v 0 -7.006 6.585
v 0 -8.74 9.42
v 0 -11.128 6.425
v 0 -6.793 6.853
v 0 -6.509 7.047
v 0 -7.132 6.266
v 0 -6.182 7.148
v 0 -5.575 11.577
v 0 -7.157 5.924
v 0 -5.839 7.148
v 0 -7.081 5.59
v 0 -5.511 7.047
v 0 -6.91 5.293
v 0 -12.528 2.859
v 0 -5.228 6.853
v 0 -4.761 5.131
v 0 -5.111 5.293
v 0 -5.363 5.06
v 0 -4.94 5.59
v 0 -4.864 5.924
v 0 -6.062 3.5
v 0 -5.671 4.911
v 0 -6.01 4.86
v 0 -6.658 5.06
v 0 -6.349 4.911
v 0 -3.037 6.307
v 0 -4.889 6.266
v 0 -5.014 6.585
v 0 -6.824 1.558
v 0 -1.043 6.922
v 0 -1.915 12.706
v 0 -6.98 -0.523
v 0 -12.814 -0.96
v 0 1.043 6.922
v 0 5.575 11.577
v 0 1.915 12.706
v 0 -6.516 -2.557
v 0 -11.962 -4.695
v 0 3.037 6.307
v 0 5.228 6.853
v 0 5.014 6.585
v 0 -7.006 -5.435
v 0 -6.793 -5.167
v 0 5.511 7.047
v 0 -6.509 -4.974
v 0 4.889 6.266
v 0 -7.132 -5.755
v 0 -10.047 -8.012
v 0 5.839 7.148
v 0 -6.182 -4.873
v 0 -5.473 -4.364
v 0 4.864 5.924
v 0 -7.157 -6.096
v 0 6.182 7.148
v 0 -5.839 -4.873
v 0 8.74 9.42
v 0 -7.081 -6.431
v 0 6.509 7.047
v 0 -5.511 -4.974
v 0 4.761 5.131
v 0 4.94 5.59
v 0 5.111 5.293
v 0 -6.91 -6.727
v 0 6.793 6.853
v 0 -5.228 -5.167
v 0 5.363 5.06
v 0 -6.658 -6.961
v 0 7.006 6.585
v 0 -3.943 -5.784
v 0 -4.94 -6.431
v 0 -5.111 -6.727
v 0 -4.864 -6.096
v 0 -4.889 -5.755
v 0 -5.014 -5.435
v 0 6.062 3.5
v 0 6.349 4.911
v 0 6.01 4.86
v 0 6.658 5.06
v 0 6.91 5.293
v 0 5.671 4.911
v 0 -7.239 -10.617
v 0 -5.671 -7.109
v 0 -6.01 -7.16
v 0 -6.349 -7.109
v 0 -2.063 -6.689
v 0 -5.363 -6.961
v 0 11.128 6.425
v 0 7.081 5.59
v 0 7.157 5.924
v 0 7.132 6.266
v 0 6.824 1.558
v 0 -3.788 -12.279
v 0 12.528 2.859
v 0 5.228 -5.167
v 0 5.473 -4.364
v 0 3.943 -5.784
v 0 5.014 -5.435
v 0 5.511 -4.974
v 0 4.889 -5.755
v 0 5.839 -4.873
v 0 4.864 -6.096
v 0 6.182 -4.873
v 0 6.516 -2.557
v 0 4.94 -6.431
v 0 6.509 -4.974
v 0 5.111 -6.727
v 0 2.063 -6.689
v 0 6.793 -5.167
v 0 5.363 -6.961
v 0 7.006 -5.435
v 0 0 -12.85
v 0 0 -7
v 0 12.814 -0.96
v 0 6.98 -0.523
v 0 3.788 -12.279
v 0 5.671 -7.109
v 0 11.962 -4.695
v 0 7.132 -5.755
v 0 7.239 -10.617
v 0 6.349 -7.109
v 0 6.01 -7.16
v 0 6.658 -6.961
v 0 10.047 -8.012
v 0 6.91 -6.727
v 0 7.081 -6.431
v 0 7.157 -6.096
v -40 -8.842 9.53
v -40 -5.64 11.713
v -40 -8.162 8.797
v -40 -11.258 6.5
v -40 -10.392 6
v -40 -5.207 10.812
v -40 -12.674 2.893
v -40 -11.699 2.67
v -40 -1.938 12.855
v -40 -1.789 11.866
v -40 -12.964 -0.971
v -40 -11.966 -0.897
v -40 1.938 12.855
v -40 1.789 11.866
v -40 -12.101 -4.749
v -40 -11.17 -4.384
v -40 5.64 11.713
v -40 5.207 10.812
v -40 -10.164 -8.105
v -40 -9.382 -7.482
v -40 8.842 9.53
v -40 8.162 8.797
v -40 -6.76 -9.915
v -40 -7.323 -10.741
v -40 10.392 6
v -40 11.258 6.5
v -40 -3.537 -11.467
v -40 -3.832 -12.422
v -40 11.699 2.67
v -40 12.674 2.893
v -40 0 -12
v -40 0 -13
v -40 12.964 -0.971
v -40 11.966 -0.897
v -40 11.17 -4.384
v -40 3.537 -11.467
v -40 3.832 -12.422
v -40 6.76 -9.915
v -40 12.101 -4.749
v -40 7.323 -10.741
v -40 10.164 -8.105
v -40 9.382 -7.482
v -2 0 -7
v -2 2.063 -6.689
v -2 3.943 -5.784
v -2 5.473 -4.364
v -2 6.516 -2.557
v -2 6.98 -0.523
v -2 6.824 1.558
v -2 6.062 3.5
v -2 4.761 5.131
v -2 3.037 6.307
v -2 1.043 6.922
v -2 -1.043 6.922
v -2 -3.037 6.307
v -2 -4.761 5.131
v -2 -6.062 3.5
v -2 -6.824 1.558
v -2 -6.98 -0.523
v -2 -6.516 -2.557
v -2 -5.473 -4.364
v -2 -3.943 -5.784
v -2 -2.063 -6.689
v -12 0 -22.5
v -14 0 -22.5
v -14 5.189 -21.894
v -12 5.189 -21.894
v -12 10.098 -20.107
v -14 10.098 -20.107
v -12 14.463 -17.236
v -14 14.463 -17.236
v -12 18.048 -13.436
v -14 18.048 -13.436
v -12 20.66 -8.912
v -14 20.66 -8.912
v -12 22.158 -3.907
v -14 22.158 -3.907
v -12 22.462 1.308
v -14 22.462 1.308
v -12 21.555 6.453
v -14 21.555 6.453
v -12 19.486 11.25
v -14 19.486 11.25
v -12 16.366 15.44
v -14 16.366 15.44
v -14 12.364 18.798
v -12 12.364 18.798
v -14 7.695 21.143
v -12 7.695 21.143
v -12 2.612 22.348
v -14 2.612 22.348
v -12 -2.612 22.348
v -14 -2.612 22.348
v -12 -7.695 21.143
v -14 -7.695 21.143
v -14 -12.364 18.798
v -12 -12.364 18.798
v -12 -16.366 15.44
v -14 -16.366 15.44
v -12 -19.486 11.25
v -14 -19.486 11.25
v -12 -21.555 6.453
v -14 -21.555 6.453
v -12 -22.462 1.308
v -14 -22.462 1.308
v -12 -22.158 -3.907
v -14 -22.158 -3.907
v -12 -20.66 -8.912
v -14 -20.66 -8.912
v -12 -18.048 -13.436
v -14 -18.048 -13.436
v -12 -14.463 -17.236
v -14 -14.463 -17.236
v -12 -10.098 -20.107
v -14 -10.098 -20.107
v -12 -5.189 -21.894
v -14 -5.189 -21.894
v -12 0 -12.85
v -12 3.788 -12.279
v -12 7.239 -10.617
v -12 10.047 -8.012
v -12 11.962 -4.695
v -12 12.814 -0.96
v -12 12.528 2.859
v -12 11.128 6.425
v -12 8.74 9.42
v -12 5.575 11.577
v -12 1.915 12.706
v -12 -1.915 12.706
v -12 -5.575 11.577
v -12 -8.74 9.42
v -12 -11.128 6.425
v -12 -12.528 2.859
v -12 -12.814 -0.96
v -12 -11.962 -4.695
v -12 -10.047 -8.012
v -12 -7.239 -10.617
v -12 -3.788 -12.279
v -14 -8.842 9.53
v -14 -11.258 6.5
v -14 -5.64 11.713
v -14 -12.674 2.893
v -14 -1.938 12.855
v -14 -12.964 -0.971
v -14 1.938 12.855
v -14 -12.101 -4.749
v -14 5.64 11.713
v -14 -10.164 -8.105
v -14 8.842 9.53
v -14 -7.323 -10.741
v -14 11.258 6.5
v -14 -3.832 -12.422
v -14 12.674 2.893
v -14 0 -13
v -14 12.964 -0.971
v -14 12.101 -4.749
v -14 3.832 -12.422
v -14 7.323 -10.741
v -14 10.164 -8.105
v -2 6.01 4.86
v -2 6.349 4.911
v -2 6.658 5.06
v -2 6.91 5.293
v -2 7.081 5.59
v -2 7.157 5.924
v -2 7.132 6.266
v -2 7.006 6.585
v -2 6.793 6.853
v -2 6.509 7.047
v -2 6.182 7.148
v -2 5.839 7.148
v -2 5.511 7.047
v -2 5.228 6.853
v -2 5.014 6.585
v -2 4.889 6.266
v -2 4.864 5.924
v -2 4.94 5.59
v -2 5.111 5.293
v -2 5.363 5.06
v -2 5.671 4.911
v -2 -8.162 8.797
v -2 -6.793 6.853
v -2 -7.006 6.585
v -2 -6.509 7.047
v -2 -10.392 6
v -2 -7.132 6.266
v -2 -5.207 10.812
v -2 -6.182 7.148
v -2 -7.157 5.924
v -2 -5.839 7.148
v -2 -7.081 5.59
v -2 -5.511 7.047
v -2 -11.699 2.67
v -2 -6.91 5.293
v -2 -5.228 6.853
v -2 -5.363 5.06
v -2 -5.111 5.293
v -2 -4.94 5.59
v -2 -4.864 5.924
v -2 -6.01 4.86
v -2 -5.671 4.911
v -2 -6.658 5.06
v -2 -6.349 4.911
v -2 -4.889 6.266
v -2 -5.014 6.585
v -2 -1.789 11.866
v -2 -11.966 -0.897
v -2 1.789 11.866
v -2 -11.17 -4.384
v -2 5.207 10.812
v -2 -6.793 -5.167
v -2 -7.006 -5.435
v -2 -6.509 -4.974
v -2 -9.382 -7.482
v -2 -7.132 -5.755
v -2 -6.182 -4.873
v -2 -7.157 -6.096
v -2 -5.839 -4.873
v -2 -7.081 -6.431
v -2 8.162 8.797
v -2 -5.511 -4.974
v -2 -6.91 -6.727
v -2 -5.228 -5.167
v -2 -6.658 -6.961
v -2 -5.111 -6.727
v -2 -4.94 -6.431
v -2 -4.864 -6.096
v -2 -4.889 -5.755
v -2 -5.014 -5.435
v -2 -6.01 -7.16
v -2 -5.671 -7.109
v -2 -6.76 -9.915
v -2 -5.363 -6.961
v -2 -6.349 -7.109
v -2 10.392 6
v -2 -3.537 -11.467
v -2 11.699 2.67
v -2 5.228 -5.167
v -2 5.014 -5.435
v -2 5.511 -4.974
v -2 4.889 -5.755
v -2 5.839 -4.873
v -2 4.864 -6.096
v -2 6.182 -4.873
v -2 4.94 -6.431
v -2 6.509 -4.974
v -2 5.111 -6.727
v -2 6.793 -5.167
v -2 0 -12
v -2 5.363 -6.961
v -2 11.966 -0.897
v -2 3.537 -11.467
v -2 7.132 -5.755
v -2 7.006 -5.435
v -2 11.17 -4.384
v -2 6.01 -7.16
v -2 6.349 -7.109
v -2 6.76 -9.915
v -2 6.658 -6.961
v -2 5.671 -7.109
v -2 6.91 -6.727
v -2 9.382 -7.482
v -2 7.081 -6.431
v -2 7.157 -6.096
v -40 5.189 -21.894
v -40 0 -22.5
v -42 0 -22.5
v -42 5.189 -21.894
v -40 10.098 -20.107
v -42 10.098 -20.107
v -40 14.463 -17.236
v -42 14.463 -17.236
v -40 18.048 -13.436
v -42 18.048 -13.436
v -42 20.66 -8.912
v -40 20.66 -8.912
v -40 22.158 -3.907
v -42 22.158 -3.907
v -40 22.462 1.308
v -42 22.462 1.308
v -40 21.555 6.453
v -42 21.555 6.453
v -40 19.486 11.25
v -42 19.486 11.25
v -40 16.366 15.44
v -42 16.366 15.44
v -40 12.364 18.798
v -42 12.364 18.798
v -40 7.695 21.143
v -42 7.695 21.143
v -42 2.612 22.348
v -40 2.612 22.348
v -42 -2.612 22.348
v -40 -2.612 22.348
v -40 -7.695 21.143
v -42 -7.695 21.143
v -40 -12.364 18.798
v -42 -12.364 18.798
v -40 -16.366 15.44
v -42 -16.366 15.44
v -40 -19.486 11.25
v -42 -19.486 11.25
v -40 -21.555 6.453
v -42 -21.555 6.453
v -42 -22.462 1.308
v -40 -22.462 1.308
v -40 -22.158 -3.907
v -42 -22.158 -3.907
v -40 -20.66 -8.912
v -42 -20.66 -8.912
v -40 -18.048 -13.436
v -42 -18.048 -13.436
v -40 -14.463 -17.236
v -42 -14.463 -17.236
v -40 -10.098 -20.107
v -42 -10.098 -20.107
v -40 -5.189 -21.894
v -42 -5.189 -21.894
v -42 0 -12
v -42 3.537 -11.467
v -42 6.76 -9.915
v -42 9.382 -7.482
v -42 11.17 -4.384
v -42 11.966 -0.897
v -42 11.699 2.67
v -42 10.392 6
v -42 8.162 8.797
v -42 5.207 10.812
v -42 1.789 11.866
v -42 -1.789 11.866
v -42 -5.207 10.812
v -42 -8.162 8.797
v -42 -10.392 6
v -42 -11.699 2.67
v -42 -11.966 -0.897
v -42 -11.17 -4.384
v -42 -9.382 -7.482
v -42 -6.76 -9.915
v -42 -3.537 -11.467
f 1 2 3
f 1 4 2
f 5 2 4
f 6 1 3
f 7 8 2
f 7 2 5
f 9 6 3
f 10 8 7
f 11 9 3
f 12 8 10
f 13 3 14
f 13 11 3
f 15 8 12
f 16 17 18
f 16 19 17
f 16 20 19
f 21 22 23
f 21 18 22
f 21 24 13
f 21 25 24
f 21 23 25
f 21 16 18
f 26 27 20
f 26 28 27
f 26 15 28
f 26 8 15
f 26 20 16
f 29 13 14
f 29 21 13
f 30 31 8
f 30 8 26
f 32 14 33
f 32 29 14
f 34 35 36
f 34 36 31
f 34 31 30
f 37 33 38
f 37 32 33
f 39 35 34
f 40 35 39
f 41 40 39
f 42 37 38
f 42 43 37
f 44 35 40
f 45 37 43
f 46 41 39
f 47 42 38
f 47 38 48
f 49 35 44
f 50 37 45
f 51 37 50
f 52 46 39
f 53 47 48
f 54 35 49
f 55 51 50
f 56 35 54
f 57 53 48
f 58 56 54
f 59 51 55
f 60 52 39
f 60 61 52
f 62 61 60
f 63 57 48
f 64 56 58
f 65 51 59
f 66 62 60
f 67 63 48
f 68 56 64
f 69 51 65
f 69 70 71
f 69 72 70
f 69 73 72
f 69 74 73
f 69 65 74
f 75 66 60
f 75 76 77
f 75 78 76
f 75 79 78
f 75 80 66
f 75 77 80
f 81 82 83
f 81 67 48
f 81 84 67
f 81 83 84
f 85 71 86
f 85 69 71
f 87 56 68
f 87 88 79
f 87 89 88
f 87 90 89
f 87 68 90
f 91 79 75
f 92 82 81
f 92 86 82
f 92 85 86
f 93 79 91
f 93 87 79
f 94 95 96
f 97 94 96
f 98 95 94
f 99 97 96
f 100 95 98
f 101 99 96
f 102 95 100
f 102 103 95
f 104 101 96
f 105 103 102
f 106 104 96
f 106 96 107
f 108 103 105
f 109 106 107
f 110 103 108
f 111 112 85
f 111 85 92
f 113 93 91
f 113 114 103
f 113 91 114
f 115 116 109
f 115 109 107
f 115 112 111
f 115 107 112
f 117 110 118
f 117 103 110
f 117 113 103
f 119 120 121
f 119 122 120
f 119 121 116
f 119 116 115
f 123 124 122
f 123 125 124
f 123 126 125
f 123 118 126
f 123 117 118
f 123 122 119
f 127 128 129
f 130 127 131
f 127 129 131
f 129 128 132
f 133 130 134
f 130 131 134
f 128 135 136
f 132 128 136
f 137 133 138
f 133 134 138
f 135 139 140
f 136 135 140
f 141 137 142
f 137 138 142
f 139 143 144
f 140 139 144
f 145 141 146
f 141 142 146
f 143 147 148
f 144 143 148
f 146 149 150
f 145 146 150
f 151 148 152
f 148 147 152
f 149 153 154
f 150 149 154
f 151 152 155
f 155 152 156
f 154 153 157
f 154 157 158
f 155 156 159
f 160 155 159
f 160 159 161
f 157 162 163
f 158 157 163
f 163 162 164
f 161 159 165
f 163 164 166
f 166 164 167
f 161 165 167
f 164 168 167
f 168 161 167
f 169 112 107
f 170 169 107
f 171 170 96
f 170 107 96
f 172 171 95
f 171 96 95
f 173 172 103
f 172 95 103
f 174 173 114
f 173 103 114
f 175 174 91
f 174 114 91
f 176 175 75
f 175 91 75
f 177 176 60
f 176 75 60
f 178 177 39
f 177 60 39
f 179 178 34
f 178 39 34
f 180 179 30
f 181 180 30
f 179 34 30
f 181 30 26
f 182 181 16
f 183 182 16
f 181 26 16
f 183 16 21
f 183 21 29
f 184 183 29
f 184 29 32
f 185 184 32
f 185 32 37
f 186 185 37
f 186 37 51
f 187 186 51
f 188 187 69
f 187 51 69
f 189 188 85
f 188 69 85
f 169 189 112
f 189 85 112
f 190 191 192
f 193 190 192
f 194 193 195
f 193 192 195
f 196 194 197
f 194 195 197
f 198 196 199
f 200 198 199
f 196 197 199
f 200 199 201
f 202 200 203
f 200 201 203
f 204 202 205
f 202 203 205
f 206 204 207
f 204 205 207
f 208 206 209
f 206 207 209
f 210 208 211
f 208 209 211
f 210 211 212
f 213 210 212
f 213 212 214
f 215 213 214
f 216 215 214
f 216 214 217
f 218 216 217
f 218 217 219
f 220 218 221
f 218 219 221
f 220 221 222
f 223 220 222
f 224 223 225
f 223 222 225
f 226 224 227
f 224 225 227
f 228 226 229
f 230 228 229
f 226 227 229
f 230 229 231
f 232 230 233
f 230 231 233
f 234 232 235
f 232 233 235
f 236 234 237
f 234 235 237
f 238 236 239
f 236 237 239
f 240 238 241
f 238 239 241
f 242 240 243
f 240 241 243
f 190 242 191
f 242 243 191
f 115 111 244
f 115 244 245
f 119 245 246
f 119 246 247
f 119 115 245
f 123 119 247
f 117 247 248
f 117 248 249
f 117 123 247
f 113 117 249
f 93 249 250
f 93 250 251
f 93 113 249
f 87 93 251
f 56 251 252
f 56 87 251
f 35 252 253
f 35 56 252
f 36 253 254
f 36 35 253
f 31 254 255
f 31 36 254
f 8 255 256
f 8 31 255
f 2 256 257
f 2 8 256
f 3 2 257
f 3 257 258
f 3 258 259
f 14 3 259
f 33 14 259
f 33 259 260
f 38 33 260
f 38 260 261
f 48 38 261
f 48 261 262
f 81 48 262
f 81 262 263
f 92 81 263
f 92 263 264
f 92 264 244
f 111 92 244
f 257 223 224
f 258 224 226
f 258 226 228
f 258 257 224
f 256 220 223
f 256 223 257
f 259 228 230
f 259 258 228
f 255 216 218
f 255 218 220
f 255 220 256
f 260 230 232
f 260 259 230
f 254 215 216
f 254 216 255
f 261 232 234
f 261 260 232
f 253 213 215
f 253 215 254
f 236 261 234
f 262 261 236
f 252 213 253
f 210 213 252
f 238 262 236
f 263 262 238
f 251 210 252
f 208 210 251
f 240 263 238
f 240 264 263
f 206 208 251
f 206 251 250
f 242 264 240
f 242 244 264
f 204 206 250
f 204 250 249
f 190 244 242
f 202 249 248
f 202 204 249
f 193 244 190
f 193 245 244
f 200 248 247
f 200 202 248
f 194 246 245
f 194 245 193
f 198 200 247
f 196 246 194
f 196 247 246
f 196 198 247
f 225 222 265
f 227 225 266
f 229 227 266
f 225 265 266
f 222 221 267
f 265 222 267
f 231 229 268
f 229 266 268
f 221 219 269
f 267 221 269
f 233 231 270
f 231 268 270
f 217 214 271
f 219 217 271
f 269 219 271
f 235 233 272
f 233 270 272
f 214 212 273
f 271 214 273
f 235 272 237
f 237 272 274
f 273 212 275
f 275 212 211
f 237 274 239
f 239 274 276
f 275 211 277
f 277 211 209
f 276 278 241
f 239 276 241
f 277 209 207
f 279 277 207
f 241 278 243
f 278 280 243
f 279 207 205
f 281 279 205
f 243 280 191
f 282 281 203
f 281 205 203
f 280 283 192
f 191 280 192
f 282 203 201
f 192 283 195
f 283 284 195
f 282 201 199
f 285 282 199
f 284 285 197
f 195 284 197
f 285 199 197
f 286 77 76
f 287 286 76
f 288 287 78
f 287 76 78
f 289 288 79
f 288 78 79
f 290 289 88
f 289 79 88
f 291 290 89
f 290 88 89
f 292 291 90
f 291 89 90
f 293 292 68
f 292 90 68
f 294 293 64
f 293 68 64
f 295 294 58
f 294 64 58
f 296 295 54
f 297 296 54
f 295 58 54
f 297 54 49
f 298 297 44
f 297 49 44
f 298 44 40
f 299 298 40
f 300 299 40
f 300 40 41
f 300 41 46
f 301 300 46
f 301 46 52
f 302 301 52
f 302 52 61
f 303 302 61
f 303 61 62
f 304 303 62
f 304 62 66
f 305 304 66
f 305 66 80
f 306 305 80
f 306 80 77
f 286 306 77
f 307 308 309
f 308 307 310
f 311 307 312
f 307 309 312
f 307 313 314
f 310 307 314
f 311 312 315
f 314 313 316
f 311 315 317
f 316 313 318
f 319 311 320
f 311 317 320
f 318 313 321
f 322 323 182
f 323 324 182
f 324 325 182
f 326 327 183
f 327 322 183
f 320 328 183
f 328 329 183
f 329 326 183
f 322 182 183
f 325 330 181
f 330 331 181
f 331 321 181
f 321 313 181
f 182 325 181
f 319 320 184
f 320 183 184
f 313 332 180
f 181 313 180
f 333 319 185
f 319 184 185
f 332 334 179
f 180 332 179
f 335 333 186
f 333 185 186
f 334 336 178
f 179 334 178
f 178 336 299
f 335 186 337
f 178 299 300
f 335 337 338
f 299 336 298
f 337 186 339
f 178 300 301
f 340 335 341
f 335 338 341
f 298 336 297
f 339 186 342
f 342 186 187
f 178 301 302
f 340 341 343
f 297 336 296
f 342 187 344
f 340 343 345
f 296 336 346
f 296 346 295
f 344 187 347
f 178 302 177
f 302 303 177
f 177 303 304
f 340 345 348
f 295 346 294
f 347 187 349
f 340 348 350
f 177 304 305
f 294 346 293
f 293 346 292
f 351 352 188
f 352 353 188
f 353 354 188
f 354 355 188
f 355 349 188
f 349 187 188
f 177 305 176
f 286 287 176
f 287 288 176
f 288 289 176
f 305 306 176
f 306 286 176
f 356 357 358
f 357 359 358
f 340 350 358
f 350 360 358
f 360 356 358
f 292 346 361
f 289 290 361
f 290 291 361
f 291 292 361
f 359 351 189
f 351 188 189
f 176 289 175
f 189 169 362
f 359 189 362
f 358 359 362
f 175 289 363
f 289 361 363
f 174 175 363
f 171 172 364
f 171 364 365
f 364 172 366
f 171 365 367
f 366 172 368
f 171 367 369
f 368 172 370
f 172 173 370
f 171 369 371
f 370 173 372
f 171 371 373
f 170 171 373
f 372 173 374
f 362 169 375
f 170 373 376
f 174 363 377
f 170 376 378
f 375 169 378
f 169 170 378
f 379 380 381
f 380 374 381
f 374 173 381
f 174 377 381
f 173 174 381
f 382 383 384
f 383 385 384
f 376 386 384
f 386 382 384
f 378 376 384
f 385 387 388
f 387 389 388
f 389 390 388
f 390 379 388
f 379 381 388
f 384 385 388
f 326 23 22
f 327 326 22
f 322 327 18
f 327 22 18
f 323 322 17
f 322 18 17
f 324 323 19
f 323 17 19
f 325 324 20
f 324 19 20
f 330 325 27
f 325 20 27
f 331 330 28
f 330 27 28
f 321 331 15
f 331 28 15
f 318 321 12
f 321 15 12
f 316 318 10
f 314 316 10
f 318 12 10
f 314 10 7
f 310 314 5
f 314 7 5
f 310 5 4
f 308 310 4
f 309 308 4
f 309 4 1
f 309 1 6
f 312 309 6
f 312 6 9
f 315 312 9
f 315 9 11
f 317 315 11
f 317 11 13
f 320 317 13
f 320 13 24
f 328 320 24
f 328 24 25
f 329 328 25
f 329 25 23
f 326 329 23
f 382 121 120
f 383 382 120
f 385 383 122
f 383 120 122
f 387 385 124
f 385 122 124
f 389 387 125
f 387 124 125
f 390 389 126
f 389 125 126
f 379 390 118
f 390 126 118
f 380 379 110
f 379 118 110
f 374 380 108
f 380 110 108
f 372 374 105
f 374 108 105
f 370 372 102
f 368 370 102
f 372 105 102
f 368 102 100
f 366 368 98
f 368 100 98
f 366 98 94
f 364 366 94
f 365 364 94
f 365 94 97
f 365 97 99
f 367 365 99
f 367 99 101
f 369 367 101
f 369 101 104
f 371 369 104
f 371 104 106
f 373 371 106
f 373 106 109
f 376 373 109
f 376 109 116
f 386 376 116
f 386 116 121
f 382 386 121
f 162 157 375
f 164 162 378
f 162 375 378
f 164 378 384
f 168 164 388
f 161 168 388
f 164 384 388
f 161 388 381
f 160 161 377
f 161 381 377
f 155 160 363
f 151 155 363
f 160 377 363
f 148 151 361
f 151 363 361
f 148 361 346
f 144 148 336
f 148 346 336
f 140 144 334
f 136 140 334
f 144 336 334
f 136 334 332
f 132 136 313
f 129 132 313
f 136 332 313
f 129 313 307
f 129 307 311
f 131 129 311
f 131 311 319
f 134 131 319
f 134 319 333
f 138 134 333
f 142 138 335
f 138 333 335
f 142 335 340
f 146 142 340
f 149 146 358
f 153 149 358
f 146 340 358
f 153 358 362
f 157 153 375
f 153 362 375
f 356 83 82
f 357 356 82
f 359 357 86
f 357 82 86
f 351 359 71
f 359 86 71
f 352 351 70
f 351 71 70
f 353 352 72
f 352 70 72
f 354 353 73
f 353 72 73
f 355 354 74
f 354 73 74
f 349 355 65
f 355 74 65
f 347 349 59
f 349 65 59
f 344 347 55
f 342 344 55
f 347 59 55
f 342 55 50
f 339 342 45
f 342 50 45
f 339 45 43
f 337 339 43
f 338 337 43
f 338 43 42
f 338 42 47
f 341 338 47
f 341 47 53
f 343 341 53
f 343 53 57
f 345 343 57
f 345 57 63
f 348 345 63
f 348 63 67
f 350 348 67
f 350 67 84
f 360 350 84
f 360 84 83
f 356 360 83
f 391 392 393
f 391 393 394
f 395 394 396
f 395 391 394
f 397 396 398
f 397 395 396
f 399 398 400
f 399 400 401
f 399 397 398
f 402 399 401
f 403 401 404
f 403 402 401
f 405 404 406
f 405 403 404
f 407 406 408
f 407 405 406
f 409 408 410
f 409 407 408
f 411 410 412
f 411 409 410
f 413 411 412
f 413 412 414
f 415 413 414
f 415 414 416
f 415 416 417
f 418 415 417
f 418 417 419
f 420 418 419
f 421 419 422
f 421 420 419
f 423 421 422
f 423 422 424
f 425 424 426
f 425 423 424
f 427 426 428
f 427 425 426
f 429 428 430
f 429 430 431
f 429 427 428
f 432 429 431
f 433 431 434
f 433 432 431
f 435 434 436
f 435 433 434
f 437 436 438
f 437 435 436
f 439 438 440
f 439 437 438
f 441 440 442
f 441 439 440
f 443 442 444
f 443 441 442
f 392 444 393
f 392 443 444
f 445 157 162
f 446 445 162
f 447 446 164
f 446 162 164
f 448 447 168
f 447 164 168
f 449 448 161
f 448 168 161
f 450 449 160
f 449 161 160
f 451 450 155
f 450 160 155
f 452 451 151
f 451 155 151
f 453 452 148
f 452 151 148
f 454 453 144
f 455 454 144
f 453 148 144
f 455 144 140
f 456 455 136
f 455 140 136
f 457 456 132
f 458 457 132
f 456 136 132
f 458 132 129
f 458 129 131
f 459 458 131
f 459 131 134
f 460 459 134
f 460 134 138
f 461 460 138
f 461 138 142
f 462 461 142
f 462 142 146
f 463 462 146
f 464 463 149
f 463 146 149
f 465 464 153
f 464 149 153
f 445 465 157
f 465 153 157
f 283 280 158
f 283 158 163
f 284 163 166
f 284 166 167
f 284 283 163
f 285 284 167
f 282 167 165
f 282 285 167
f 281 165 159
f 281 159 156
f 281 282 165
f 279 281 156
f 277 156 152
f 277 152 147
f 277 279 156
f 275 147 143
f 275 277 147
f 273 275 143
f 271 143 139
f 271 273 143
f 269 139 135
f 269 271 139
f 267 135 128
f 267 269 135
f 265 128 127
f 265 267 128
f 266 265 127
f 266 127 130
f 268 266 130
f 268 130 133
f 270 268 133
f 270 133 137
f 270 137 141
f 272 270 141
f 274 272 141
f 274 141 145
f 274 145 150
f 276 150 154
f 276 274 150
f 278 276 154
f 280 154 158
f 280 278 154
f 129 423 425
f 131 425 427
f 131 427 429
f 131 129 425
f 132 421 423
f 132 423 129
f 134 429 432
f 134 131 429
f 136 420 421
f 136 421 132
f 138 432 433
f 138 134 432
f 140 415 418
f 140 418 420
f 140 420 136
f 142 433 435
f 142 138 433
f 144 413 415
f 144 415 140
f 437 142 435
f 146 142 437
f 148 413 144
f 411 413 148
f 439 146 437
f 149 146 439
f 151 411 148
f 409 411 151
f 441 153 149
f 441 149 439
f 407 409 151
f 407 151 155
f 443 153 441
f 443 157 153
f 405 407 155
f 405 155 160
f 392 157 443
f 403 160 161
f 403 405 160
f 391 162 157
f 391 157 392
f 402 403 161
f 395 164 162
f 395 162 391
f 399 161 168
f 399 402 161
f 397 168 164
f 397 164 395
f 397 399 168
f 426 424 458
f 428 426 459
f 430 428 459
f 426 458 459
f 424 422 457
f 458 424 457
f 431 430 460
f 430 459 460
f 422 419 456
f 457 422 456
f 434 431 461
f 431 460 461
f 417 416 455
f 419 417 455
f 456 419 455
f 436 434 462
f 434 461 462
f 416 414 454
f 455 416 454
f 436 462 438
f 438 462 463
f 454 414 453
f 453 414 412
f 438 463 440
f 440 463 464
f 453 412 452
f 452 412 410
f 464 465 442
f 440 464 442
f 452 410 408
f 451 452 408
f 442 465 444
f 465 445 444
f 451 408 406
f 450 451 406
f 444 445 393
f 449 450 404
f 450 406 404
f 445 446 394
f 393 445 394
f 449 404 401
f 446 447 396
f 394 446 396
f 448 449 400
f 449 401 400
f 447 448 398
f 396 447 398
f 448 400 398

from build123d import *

# Parameters (mm, degrees)
SKETCH2_R           = 12.85
SKETCH2_R_2         = 12
BOSS_EXTRUDE2_DEPTH = 14
SKETCH3_R           = 12.85
SKETCH3_R_2         = 7
BOSS_EXTRUDE3_DEPTH = 2
BOSS_EXTRUDE5_START = -14
SKETCH4_R           = 22.5
SKETCH4_R_2         = 12
BOSS_EXTRUDE5_DEPTH = 2
BOSS_EXTRUDE6_START = -14
SKETCH6_R           = 13
SKETCH6_R_2         = 12
BOSS_EXTRUDE6_DEPTH = 26
BOSS_EXTRUDE7_START = -40
SKETCH7_R           = 22.5
SKETCH7_R_2         = 12
BOSS_EXTRUDE7_DEPTH = 2
SKETCH8_R           = 1.15
CUT_EXTRUDE1_DEPTH  = 43


with BuildPart() as part:
    # Sketch2 → Boss-Extrude2 (new body)
    with BuildSketch(Plane(origin=(0, 0, 0), x_dir=(0, 0, -1), z_dir=(1, 0, 0))):
        Circle(SKETCH2_R)
        Circle(SKETCH2_R_2, mode=Mode.SUBTRACT)
    extrude(amount=-BOSS_EXTRUDE2_DEPTH)

    # Sketch3 → Boss-Extrude3 (add)
    with BuildSketch(Plane(origin=(0, 0, 0), x_dir=(0, 0, -1), z_dir=(1, 0, 0))):
        Circle(SKETCH3_R)
        Circle(SKETCH3_R_2, mode=Mode.SUBTRACT)
    extrude(amount=-BOSS_EXTRUDE3_DEPTH)

    # Sketch4 → Boss-Extrude5 (add)
    with BuildSketch(Plane(origin=(0, 0, 0), x_dir=(0, 0, -1), z_dir=(1, 0, 0)).offset(BOSS_EXTRUDE5_START)):
        Circle(SKETCH4_R)
        Circle(SKETCH4_R_2, mode=Mode.SUBTRACT)
    extrude(amount=BOSS_EXTRUDE5_DEPTH)

    # Sketch6 → Boss-Extrude6 (add)
    with BuildSketch(Plane(origin=(0, 0, 0), x_dir=(0, 0, -1), z_dir=(1, 0, 0)).offset(BOSS_EXTRUDE6_START)):
        Circle(SKETCH6_R)
        Circle(SKETCH6_R_2, mode=Mode.SUBTRACT)
    extrude(amount=-BOSS_EXTRUDE6_DEPTH)

    # Sketch8 → Cut-Extrude1 (cut, through all)
    with BuildSketch(Plane(origin=(0, 0, 0), x_dir=(0, 0, -1), z_dir=(1, 0, 0))):
        with Locations((6.01040764, 6.01040764)):
            Circle(SKETCH8_R)
        with Locations((6.01040764, -6.01040764)):
            Circle(SKETCH8_R)
        with Locations((-6.01040764, -6.01040764)):
            Circle(SKETCH8_R)
        with Locations((-6.01040764, 6.01040764)):
            Circle(SKETCH8_R)
    extrude(amount=-CUT_EXTRUDE1_DEPTH, mode=Mode.SUBTRACT)


with BuildPart() as body_2:
    # Sketch7 → Boss-Extrude7 (new body)
    with BuildSketch(Plane(origin=(0, 0, 0), x_dir=(0, 0, -1), z_dir=(1, 0, 0)).offset(BOSS_EXTRUDE7_START)):
        Circle(SKETCH7_R)
        Circle(SKETCH7_R_2, mode=Mode.SUBTRACT)
    extrude(amount=-BOSS_EXTRUDE7_DEPTH)


solid = Compound([part.part, body_2.part])
